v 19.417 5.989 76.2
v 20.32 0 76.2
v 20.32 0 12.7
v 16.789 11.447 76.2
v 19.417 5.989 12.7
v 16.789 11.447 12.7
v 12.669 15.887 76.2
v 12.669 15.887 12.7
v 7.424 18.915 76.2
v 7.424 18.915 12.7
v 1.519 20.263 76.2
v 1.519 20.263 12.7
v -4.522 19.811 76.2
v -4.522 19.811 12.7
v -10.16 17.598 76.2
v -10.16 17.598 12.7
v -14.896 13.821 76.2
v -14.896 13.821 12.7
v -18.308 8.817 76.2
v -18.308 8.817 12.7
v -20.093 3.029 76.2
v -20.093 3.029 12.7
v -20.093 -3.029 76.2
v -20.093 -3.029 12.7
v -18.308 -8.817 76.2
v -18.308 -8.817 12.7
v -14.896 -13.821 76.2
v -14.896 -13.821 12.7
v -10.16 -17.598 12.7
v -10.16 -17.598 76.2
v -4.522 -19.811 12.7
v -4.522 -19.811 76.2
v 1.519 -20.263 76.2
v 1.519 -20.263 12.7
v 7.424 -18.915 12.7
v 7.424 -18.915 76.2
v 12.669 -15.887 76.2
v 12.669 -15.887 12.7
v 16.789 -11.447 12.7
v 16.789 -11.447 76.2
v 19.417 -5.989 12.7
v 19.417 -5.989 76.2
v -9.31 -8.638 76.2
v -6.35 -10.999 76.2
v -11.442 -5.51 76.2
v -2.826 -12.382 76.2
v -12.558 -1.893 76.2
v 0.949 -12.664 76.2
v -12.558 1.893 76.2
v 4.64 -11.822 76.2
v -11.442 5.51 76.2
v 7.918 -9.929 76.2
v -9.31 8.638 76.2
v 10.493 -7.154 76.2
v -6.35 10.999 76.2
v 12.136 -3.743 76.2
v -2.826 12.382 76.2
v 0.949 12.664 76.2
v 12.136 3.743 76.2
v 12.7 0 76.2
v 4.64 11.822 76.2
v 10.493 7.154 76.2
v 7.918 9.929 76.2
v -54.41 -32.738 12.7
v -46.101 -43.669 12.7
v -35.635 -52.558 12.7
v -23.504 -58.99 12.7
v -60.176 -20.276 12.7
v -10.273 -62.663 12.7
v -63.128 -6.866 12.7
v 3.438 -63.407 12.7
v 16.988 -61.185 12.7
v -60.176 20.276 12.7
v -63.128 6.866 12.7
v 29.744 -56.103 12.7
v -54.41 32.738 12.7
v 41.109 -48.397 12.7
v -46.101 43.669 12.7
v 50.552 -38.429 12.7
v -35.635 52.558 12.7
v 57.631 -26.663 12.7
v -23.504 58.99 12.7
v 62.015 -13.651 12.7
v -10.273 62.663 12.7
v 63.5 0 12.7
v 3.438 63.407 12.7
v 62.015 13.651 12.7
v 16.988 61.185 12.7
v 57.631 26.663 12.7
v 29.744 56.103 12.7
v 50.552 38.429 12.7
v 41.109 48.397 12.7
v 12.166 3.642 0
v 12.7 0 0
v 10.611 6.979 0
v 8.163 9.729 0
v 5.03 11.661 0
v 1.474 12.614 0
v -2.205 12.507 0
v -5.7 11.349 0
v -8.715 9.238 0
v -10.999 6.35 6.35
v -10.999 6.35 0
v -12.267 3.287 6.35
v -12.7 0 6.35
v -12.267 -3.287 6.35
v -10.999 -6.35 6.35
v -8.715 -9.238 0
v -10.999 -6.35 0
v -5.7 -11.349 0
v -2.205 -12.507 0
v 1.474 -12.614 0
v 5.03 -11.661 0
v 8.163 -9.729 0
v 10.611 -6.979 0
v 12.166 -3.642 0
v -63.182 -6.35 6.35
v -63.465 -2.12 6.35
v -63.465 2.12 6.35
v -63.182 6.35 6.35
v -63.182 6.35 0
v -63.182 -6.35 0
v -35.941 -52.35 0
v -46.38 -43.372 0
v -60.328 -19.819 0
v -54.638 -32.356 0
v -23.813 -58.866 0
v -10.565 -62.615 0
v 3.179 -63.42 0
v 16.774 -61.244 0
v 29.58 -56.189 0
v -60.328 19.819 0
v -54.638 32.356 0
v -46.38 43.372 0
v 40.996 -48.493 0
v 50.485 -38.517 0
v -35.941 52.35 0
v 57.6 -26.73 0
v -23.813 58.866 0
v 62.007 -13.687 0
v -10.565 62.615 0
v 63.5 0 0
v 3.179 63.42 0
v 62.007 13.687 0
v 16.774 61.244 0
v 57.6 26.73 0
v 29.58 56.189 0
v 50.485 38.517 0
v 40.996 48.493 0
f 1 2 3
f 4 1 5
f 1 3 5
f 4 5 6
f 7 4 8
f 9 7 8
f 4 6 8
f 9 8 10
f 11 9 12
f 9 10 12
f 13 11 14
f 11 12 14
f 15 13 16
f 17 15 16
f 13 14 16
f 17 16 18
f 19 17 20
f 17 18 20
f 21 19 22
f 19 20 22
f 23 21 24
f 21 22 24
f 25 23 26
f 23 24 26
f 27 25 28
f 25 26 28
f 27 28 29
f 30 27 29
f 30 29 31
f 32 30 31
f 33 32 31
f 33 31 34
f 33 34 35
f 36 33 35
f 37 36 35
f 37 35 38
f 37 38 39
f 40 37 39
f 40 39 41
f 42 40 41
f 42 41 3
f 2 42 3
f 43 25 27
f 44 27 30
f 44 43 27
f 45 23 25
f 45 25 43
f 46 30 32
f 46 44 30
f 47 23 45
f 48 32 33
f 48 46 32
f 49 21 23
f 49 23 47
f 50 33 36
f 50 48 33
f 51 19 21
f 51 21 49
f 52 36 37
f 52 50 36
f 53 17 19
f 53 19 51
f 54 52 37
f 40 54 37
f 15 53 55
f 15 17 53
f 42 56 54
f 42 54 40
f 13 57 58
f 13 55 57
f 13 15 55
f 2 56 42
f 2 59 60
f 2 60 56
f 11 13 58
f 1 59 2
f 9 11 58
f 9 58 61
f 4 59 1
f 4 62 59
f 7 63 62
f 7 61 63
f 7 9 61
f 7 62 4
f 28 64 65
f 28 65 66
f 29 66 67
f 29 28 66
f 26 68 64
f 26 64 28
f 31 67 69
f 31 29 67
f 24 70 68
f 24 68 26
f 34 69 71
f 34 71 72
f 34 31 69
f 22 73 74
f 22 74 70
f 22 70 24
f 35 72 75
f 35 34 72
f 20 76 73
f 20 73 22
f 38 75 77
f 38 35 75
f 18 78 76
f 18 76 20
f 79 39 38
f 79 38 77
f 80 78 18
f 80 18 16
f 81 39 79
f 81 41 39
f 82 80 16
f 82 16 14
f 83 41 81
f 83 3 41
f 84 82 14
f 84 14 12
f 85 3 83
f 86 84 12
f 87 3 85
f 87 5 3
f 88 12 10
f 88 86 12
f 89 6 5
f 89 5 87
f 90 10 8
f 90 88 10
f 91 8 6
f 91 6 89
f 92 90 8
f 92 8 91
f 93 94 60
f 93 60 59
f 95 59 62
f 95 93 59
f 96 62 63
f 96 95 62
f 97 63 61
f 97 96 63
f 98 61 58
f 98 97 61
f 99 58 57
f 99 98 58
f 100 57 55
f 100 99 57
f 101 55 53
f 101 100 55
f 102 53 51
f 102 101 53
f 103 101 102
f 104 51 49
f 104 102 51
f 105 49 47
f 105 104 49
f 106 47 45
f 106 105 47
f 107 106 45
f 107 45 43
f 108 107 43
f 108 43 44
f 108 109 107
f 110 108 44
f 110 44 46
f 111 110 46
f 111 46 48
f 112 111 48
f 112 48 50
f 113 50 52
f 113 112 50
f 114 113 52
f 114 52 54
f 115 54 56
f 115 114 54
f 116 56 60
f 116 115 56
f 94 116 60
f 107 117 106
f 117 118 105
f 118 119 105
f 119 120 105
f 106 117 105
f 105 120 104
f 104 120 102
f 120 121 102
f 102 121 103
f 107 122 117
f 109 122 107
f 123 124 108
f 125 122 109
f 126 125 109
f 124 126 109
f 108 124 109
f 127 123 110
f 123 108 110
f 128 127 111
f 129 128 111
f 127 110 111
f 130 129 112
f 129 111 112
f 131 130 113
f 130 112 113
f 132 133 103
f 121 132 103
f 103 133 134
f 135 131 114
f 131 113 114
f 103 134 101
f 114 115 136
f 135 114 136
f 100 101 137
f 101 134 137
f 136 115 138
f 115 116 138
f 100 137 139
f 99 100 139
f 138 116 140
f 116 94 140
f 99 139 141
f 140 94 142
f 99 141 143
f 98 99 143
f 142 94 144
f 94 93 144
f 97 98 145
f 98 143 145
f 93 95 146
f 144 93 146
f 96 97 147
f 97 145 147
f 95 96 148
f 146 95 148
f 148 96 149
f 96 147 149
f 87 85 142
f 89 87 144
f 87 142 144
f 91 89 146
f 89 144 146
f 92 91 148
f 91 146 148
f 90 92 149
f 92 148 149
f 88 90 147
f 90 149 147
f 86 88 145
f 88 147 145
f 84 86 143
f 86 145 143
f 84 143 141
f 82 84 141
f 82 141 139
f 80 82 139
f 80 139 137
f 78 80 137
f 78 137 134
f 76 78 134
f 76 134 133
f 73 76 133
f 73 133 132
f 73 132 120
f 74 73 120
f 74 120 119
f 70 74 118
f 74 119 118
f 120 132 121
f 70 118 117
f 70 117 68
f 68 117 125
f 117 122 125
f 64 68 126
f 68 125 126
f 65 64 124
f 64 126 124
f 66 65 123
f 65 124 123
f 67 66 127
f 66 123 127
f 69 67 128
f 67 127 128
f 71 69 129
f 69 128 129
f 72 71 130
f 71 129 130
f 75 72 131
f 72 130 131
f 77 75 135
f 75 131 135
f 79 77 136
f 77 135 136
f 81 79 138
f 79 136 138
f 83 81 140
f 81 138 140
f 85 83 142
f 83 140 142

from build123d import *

# Parameters (mm, degrees)
F0_R     = 63.5
F0_R_2   = 20.32
F1_DEPTH = 12.7
F0_R_3   = 12.7
F2_DEPTH = 76.2
F3_W     = 127
F3_H     = 12.7
F4_DEPTH = 6.35


with BuildPart() as f1:
    # F0 (on Top) → F1 (new body)
    with BuildSketch(Plane.XY):
        Circle(F0_R)
        Circle(F0_R_2, mode=Mode.SUBTRACT)
    extrude(amount=F1_DEPTH)

    # F0 (on Top) → F2 (join)
    with BuildSketch(Plane.XY):
        Circle(F0_R_2)
        Circle(F0_R_3, mode=Mode.SUBTRACT)
    extrude(amount=F2_DEPTH)

    # F3 (on Top) → F4 (cut)
    with BuildSketch(Plane.XY):
        with Locations((-63.5, 0)):
            Rectangle(F3_W, F3_H)
    extrude(amount=F4_DEPTH, mode=Mode.SUBTRACT)


solid = f1.part
